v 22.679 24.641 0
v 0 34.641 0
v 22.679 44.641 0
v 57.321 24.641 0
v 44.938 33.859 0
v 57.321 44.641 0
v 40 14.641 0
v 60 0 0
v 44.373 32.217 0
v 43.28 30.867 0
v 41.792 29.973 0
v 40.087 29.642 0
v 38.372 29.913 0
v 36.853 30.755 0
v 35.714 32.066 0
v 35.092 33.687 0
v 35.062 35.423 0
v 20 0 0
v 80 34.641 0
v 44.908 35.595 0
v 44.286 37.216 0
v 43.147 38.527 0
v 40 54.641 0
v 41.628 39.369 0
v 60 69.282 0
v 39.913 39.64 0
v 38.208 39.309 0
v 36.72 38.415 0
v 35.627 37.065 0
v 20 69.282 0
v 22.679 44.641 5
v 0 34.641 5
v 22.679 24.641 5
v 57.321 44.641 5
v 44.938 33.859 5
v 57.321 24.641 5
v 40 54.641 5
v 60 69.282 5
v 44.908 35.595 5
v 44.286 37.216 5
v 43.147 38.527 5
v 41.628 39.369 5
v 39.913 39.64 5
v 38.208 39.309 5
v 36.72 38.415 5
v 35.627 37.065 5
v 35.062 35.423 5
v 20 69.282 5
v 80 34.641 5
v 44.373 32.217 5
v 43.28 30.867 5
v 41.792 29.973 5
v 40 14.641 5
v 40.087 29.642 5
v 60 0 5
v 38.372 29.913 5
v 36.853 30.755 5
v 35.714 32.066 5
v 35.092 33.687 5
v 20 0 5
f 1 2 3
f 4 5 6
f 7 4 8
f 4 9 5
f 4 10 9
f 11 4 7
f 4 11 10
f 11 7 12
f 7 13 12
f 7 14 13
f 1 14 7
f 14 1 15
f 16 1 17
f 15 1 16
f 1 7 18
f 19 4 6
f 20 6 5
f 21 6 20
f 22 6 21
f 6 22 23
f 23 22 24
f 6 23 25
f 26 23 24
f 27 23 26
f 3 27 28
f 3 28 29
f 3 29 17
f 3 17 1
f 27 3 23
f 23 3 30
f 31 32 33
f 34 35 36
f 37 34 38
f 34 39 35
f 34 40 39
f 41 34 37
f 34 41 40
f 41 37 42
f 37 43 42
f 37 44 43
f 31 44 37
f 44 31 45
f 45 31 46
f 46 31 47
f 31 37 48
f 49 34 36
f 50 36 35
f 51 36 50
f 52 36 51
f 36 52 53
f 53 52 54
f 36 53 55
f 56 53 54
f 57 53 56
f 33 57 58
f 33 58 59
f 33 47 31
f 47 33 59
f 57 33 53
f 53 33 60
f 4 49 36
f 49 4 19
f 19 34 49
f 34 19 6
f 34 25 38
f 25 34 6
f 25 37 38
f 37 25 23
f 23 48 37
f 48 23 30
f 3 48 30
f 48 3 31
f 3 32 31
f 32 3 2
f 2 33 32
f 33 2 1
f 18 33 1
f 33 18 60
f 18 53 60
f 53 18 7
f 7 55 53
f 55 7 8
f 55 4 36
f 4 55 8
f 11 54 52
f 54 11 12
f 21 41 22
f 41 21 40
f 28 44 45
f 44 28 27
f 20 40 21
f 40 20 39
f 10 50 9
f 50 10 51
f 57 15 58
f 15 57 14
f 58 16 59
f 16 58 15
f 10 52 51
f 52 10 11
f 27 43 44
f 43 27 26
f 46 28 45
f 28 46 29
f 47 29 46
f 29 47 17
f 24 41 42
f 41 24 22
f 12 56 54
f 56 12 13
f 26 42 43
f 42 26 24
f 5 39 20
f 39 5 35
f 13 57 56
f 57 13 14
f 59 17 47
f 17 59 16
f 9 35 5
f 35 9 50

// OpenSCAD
$fn = 32;

// ----------------------------------------------------------------------
// Star wheel: 6-point star, R40
// ----------------------------------------------------------------------

// --- parameters (mm) ---
n_points = 6;             // number of points / teeth
r_out = 40;               // tip radius
r_in = 20;                // root radius
bore_r = 5;               // centre bore radius
plate_t = 5;              // plate thickness, Z (extrusion height)
bore_d = 10;              // centre bore diameter

profile = [[0, 34.641], [22.679, 24.641], [20, 0], [40, 14.641], [60, 0], [57.321, 24.641], [80, 34.641], [57.321, 44.641], [60, 69.282], [40, 54.641], [20, 69.282], [22.679, 44.641]];  // primary outline, 12 points, counter clockwise
void_1 = [[44.908, 35.595], [44.286, 37.216], [43.147, 38.527], [41.628, 39.369], [39.913, 39.64], [38.208, 39.309], [36.72, 38.415], [35.627, 37.065], [35.062, 35.423], [35.092, 33.687], [35.714, 32.066], [36.853, 30.755], [38.372, 29.913], [40.087, 29.642], [41.792, 29.973], [43.28, 30.867], [44.373, 32.217], [44.938, 33.859]];  // centre bore, 18 points

// --- the one profile operation ---
difference() {
  linear_extrude(height = plate_t) polygon(points = profile);
  translate([0, 0, -1])
    linear_extrude(height = plate_t + 2) polygon(points = void_1);
}
